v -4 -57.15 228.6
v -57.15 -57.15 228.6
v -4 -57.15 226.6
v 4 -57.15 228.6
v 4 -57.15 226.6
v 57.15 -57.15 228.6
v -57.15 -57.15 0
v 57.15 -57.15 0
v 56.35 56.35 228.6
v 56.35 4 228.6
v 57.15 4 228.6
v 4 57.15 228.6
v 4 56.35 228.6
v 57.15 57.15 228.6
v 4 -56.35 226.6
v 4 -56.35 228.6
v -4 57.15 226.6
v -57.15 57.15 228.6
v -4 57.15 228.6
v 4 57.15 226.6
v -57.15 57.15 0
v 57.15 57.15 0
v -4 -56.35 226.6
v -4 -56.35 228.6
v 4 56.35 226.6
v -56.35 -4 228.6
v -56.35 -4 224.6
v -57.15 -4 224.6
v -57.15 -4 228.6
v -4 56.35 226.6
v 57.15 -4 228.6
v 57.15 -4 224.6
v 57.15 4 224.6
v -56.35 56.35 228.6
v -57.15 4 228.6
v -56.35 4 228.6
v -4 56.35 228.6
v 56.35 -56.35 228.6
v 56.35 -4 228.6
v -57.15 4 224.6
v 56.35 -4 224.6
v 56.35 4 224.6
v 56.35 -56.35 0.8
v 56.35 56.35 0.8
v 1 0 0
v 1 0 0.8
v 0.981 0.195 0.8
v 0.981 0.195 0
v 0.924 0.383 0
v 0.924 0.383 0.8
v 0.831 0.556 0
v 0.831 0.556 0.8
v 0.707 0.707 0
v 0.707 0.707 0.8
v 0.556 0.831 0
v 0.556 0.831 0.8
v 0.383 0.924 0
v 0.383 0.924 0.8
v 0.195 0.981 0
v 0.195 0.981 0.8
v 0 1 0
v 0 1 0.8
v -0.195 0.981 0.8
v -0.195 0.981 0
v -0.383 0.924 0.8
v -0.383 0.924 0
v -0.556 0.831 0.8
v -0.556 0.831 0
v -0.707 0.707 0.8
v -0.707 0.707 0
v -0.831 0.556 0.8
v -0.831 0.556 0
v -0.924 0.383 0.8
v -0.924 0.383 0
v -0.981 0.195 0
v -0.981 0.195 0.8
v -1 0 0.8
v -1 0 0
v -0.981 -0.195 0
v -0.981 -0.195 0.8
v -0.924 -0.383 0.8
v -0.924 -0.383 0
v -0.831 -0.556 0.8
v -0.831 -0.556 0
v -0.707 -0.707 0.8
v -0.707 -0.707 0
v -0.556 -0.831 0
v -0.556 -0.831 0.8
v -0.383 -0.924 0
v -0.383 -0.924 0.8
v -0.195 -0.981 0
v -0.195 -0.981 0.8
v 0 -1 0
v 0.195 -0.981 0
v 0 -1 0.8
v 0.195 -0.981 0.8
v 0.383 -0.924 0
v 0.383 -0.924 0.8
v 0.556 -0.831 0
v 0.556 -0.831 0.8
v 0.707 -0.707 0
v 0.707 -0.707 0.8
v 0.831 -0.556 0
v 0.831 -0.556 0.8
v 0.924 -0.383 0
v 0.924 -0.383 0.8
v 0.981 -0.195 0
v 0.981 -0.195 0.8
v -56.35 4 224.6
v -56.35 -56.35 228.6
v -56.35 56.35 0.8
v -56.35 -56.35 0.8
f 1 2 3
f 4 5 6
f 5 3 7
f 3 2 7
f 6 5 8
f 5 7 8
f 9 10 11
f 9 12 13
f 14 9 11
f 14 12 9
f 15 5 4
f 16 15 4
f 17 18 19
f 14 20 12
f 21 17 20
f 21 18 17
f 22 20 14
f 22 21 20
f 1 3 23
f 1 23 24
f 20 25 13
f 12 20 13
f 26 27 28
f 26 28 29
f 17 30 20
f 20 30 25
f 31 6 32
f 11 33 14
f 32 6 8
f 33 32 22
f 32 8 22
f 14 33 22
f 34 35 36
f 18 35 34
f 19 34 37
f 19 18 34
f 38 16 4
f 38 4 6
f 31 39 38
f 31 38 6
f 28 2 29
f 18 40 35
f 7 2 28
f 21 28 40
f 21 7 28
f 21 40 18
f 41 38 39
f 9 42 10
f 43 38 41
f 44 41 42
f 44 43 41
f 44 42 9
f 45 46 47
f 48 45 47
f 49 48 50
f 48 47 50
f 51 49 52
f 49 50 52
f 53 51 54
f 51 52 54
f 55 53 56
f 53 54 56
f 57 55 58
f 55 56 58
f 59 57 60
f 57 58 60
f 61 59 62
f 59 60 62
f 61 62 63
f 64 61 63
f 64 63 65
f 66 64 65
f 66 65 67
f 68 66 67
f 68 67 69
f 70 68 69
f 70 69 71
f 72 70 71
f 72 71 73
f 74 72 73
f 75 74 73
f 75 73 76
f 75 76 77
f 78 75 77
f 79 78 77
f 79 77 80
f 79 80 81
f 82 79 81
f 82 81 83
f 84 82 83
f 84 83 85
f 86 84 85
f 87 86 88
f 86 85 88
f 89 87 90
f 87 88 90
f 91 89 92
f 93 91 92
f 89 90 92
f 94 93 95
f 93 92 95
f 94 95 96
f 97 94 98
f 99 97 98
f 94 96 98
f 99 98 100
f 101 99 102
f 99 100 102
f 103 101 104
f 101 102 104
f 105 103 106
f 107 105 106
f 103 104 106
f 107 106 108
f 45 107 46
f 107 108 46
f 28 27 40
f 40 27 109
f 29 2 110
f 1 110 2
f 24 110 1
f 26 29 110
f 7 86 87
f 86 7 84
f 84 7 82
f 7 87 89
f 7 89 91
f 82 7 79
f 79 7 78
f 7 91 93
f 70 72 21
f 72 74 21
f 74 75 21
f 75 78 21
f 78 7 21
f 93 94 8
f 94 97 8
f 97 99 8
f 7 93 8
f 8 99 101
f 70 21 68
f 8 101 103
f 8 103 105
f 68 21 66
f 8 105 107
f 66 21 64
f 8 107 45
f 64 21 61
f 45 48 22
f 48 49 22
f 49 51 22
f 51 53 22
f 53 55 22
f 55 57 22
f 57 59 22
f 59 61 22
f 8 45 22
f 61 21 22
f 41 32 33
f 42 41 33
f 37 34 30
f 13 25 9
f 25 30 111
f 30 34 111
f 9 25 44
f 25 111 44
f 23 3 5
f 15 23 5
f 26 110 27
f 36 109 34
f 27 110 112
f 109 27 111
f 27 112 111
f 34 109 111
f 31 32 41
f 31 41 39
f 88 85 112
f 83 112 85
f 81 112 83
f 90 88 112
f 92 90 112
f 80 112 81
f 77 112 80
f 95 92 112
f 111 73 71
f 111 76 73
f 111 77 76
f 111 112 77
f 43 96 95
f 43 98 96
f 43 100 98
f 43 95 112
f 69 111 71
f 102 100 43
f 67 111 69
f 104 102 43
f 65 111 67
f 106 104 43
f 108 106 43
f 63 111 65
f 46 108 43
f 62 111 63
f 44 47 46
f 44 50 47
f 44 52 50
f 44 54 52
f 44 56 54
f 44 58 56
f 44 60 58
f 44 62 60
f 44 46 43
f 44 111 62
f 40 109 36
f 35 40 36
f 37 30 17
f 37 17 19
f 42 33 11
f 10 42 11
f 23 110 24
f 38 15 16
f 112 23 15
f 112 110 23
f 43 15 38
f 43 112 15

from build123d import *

# Parameters (mm, degrees)
F0_W     = 114.3
F0_H     = 114.3
F1_DEPTH = 228.6
F2_T     = -0.8
F3_R     = 1
F4_DEPTH = 25.4
F5_W     = 8
F5_H     = 2
F6_DEPTH = 114.301
F7_W     = 8
F7_H     = 4
F8_DEPTH = 114.301


with BuildPart() as f1:
    # F0 (on Top) → F1 (new body)
    with BuildSketch(Plane.XY):
        Rectangle(F0_W, F0_H)
    extrude(amount=F1_DEPTH)

    # F2
    f2_openings = [f1.faces().sort_by_distance(p)[0] for p in [
        (0, 0, 228.6),
    ]]
    offset(amount=F2_T, openings=f2_openings)

    # F3 (on face) → F4 (cut)
    with BuildSketch(Plane.XY.offset(0.8)):
        Circle(F3_R)
    extrude(amount=-F4_DEPTH, mode=Mode.SUBTRACT)

    # F5 (on face) → F6 (cut, through all)
    with BuildSketch(Plane.XZ.offset(57.15)):
        with Locations((0, 227.6)):
            Rectangle(F5_W, F5_H)
    extrude(amount=-F6_DEPTH, mode=Mode.SUBTRACT)

    # F7 (on face) → F8 (cut, through all)
    with BuildSketch(Plane.YZ.offset(57.15)):
        with Locations((0, 226.6)):
            Rectangle(F7_W, F7_H)
    extrude(amount=-F8_DEPTH, mode=Mode.SUBTRACT)


solid = f1.part
